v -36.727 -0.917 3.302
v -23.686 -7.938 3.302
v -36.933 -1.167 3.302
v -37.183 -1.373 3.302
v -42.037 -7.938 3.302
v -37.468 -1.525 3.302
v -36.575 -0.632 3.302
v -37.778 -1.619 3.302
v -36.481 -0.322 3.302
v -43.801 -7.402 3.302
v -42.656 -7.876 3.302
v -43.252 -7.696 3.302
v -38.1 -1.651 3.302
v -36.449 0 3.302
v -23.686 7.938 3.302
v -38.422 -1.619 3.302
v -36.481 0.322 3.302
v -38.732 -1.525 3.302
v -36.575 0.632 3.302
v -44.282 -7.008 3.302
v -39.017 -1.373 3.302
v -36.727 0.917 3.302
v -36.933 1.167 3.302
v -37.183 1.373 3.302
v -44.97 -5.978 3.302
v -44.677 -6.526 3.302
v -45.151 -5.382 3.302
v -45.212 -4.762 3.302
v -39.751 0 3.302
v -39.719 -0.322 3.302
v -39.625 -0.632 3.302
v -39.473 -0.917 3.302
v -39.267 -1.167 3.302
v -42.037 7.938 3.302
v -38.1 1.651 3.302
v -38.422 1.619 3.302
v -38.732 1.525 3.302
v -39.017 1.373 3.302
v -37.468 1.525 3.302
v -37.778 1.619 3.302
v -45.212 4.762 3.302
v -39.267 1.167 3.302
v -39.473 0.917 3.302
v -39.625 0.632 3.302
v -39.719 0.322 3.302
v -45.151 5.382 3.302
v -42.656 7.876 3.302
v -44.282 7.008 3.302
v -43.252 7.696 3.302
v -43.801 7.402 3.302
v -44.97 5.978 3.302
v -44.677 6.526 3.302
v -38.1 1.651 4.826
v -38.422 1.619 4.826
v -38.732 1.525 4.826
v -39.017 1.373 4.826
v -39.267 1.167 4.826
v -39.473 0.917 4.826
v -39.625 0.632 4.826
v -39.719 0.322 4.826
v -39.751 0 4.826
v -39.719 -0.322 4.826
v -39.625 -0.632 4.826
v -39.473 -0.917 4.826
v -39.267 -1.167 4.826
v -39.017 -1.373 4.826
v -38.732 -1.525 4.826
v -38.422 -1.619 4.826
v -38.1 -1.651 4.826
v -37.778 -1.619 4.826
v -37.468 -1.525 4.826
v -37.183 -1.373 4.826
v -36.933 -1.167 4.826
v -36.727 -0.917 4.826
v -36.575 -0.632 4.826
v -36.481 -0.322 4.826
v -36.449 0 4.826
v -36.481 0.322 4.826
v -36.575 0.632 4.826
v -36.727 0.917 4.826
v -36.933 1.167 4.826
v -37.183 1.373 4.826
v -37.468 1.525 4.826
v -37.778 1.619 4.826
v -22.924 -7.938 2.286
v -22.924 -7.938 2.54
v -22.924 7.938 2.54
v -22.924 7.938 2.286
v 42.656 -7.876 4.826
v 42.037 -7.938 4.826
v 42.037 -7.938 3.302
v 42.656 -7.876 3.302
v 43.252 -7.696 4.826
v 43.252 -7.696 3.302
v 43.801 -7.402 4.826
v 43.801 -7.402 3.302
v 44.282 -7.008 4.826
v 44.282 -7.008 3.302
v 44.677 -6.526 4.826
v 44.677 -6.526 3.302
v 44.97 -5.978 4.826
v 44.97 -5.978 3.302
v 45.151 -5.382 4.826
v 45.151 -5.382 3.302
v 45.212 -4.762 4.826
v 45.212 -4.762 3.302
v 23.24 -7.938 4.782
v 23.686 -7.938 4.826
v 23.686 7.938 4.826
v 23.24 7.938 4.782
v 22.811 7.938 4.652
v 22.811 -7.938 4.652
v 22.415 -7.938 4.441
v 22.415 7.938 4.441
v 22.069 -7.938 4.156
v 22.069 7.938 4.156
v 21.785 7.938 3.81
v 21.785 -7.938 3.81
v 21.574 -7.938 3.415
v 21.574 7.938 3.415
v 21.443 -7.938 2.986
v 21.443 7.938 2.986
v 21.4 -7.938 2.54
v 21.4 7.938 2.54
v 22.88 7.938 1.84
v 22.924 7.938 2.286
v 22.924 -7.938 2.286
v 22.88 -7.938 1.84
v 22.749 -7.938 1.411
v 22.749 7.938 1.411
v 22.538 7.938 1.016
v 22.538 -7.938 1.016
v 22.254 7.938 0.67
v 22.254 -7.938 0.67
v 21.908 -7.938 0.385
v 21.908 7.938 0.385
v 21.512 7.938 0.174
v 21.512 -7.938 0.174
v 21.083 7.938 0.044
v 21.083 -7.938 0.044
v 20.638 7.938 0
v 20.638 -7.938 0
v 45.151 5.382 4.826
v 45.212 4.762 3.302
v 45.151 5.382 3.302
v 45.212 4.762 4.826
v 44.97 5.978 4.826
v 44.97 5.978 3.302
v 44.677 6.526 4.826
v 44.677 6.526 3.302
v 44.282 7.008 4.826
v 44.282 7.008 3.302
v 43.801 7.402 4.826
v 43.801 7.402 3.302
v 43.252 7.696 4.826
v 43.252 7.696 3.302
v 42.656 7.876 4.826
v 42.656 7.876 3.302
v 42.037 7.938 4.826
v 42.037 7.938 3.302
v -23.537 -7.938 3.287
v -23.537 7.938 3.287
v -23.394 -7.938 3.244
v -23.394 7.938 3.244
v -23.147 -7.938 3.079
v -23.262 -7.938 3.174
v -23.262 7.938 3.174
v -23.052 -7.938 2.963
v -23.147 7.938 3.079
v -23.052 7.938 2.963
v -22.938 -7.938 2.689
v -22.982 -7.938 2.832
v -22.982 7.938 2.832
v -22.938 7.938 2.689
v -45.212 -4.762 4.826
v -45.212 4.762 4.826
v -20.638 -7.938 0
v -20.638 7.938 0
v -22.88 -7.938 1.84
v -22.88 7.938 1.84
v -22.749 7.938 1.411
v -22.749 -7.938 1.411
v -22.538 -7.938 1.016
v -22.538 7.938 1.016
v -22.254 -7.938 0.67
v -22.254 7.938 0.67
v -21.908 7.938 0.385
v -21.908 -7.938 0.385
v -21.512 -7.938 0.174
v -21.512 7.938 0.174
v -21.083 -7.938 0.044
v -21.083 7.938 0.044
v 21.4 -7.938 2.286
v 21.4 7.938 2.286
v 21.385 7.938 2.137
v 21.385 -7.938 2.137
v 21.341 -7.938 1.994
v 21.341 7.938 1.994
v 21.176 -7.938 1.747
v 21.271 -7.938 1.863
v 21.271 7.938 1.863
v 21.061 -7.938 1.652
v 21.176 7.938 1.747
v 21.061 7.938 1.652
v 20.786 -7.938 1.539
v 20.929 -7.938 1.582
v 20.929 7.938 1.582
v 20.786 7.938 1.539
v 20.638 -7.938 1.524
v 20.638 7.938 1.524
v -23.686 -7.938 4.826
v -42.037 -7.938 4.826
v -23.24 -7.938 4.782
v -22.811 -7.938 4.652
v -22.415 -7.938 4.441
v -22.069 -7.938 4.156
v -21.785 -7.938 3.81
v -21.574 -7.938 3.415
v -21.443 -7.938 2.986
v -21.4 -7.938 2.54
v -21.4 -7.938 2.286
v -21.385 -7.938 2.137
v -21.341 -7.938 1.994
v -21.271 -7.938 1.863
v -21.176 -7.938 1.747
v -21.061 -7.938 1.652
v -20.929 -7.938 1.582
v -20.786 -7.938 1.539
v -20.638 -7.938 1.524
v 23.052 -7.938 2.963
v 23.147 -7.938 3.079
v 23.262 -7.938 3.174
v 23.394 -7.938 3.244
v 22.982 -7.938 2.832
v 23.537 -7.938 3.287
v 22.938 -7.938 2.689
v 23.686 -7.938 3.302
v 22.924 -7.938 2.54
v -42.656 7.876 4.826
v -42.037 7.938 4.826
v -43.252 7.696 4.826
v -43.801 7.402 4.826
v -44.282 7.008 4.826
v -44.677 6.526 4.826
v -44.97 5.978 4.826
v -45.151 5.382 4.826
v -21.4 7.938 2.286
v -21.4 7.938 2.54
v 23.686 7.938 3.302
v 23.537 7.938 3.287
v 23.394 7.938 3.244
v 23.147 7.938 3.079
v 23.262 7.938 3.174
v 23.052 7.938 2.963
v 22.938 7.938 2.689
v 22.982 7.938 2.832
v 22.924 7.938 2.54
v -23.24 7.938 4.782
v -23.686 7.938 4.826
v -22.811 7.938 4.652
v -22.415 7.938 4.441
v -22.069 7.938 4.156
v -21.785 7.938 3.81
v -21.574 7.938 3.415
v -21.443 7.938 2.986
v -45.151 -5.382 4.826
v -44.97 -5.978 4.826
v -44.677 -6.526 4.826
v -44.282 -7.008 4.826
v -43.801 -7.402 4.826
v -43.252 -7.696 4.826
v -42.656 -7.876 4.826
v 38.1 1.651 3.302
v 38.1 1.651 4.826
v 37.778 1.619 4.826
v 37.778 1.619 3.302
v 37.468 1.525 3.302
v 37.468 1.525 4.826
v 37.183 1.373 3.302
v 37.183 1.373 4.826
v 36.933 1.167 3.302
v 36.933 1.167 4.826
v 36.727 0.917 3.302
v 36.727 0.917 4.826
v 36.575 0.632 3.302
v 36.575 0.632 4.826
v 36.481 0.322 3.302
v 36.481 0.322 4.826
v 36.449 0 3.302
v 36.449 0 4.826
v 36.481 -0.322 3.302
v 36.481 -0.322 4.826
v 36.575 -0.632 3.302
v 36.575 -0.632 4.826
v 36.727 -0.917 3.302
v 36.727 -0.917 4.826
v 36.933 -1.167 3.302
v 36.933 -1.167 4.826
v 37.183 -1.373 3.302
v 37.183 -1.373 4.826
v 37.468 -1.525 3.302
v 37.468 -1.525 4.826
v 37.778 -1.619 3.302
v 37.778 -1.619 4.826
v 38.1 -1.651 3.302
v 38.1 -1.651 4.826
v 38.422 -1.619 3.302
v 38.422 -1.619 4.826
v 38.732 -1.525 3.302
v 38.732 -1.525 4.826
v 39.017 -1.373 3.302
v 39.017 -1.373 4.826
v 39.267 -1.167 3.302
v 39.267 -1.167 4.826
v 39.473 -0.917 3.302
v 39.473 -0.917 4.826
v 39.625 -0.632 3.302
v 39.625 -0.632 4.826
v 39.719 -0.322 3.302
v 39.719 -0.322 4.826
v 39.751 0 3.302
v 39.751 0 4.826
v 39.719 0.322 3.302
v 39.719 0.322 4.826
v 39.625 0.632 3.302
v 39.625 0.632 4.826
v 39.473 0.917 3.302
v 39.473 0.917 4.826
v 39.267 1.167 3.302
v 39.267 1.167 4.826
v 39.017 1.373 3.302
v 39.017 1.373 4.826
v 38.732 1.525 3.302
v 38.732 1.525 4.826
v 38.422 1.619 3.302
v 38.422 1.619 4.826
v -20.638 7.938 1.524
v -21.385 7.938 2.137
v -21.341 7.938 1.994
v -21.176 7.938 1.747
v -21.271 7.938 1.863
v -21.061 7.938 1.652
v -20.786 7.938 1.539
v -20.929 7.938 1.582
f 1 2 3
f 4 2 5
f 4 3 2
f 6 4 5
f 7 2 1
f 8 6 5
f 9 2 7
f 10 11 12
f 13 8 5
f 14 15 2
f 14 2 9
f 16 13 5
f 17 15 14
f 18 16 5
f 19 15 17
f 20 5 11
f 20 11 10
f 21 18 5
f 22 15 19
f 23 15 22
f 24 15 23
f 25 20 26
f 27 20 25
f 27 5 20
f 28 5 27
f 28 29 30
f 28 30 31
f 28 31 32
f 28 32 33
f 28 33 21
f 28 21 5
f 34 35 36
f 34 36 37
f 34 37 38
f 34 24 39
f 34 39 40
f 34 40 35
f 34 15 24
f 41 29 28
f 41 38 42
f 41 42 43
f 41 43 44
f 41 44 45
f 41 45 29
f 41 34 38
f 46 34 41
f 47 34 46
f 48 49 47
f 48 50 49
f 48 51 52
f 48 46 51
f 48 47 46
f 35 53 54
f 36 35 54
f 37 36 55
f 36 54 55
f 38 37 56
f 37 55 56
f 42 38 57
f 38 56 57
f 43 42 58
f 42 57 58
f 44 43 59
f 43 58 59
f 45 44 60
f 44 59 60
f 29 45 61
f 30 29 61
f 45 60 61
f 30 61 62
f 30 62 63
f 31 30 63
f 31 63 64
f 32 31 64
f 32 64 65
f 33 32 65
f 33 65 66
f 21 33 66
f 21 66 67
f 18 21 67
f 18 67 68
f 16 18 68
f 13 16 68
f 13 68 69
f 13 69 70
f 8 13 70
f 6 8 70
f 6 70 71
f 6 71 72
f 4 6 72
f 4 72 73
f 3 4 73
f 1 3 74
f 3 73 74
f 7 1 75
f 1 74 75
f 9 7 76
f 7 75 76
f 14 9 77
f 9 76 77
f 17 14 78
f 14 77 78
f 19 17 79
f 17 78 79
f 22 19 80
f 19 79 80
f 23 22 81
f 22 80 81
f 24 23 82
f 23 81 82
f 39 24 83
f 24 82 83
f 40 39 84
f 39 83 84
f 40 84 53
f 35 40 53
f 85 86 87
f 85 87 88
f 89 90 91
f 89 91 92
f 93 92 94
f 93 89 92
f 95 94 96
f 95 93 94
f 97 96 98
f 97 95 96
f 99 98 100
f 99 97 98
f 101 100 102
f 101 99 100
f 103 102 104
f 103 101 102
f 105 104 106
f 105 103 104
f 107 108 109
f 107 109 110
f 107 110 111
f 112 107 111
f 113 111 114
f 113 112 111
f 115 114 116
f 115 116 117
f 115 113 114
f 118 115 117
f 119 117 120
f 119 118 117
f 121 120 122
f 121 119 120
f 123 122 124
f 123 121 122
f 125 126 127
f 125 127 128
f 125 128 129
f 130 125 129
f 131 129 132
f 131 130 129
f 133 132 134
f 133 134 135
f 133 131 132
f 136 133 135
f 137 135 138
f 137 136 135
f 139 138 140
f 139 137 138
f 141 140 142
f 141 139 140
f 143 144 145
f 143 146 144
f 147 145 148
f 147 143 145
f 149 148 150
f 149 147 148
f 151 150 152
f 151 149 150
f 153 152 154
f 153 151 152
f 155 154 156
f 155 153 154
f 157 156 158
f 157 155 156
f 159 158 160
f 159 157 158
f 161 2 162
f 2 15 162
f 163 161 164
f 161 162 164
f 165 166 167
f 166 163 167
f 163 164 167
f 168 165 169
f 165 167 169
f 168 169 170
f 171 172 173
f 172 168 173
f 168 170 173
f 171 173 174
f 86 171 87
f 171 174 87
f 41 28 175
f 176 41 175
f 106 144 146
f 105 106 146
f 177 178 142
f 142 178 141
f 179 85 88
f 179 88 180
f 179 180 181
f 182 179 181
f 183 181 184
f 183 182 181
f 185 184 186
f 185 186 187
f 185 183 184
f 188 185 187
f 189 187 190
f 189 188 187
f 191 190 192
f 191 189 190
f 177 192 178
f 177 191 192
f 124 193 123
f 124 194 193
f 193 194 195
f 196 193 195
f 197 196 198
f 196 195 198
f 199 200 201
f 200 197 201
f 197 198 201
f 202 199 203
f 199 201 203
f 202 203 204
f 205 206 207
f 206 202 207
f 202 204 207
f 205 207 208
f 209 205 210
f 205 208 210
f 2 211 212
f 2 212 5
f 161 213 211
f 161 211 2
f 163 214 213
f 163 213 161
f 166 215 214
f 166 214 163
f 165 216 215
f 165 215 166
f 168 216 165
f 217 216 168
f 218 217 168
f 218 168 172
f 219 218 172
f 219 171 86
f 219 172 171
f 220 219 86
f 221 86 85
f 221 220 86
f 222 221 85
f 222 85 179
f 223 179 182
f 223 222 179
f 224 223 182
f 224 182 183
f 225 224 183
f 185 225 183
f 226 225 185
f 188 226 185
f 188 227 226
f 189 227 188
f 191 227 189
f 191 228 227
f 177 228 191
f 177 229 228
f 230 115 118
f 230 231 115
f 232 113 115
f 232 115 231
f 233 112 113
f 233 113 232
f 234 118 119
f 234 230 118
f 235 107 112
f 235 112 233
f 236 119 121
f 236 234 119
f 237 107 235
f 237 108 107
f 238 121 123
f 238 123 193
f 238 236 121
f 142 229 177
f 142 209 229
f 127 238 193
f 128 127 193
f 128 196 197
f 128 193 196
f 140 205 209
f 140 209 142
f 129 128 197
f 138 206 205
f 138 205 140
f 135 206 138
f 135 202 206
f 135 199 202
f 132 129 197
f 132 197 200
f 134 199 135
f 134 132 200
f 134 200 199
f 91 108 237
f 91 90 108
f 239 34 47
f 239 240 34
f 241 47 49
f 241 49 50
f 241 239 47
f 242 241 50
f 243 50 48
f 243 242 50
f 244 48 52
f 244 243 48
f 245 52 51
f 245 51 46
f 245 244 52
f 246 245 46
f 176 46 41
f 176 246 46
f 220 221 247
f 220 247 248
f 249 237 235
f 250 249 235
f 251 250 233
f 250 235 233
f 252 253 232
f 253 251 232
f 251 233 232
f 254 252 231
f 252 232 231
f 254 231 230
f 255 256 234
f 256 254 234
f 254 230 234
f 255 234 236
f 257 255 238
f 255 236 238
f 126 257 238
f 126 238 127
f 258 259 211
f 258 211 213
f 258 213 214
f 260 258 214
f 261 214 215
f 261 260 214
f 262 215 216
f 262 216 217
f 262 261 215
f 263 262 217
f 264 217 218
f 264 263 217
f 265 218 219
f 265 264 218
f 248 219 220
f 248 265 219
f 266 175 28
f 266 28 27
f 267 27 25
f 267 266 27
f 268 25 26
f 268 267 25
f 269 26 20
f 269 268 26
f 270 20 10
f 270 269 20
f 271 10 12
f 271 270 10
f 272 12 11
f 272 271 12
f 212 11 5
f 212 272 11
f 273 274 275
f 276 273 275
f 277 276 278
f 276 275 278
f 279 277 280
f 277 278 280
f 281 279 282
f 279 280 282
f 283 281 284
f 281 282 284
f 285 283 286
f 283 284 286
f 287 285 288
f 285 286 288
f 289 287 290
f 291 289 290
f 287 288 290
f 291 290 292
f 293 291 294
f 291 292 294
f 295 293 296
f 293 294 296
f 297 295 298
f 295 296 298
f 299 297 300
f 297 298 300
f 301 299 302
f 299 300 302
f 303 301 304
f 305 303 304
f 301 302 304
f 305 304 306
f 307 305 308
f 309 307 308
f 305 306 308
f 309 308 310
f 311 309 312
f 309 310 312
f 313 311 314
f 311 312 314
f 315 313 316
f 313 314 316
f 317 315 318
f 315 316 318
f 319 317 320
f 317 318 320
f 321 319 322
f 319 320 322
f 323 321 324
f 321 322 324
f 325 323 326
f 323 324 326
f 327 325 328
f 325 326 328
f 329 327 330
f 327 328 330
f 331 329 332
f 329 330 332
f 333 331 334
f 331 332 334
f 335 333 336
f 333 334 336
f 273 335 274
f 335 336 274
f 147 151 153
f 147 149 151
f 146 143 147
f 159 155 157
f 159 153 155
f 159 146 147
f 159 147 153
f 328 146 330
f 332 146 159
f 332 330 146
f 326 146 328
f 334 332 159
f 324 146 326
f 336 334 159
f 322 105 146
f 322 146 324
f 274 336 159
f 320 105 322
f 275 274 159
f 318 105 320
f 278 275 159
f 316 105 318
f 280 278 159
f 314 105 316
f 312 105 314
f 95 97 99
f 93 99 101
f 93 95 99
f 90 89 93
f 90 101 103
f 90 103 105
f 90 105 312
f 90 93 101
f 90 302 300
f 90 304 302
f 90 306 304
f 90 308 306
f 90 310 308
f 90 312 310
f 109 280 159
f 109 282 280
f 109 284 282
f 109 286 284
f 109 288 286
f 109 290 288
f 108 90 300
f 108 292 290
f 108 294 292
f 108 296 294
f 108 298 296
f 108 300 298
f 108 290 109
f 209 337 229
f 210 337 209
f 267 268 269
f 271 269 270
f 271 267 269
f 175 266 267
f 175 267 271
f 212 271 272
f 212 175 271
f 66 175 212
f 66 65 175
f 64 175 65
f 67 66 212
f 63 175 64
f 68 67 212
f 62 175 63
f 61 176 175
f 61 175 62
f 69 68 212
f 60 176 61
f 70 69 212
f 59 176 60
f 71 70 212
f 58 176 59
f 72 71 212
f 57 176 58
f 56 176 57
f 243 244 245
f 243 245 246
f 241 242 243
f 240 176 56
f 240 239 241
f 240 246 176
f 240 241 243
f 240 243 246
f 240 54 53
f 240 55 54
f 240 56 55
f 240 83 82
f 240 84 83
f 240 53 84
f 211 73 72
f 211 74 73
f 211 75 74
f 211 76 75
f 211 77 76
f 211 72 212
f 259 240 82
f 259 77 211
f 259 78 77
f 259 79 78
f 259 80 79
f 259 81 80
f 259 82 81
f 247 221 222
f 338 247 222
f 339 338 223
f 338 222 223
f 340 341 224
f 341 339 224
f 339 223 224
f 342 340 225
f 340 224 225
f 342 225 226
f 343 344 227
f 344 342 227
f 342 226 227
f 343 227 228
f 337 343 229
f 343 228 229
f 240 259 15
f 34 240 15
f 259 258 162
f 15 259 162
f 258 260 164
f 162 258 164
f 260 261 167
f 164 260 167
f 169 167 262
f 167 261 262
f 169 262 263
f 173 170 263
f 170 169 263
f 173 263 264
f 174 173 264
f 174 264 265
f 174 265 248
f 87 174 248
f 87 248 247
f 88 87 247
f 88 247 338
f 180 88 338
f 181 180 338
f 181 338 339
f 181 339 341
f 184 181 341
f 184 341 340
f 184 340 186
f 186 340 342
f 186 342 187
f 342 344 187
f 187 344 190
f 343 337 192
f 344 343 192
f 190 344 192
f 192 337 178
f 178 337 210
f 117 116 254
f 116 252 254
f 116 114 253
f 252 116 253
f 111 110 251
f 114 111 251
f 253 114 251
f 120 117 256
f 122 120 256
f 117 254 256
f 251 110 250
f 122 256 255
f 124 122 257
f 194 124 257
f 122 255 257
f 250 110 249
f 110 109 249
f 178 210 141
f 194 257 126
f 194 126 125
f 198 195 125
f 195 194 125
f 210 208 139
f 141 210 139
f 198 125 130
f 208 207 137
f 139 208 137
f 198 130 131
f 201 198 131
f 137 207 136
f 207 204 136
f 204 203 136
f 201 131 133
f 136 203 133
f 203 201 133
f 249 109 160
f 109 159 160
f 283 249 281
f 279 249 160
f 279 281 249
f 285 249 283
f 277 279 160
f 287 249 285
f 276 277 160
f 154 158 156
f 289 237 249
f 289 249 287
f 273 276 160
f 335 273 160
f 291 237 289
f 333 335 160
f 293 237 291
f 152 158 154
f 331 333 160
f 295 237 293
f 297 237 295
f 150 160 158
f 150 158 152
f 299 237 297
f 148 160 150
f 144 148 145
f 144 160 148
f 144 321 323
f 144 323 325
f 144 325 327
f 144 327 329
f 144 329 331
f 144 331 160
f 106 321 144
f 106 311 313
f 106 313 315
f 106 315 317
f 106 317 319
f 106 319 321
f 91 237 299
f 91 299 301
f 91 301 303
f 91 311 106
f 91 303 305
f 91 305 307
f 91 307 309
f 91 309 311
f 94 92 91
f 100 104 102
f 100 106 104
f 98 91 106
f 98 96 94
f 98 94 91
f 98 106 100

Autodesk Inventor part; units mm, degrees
ref_plane "YZ Plane" through (0, 0, 0) normal (1, 0, 0) x (0, 1, 0)
ref_plane "XZ Plane" through (0, 0, 0) normal (0, 1, 0) x (-1, 0, 0)
ref_plane "XY Plane" through (0, 0, 0) normal (0, 0, 1) x (1, 0, 0)
sketch "Sketch1" plane through (0, 0, 0) normal (0, 0, 1) x (1, 0, 0)
  line L0 (-20.6375, 7.9375) -> (20.6375, 7.9375)
  line L1 (20.6375, 7.9375) -> (20.6375, -7.9375)
  line L2 (20.6375, -7.9375) -> (-20.6375, -7.9375)
  line L3 (-20.6375, -7.9375) -> (-20.6375, 7.9375)
  point P0 (0, 0)
  point P1 (0, 7.9375)
  point P2 (-20.6375, 0)
  dimension "d0" = 41.275
  dimension "d1" = 15.875
extrude "Plate1" add sketch "Sketch1" along normal blind 1.524
sketch "Sketch3" plane through (-21.3995, -7.9375, 2.286) normal (-1, 0, 0) x (0, -1, 0)
  line L0 (-15.875, 0) -> (0, 0)
  line L1 (0, 0) -> (0, 0.254)
  line L2 (0, 0.254) -> (-15.875, 0.254)
  line L3 (-15.875, 0.254) -> (-15.875, 0)
edge flange "Flange1" height 2.54 angle 90 thickness 1.524 bend radius 0.762 thickness toward (-1, 0, 0) relief tear relief width 1.524 relief depth 0.762 edges at (-20.6375, 0, 1.524) wall of the first edge with corners at (-21.3995, 7.9375, 2.286) (-21.3995, -7.9375, 2.286) (-21.3995, -7.9375, 2.54) (-21.3995, 7.9375, 2.54)
bend "Bend1"
corner "Corner1"
sketch "Sketch4" plane through (21.3995, 7.9375, 2.286) normal (1, 0, 0) x (0, 1, 0)
  line L0 (-15.875, 0) -> (0, 0)
  line L1 (0, 0) -> (0, 0.254)
  line L2 (0, 0.254) -> (-15.875, 0.254)
  line L3 (-15.875, 0.254) -> (-15.875, 0)
edge flange "Flange2" height 2.54 angle 90 thickness 1.524 bend radius 0.762 thickness toward (1, 0, 0) relief tear relief width 1.524 relief depth 0.762 edges at (20.6375, 0, 1.524) wall of the first edge with corners at (21.3995, -7.9375, 2.286) (21.3995, 7.9375, 2.286) (21.3995, 7.9375, 2.54) (21.3995, -7.9375, 2.54)
bend "Bend2"
corner "Corner2"
sketch "Sketch7" plane through (-23.6855, 7.9375, 3.302) normal (0, 0, 1) x (1, 0, 0)
  line L0 (0, -15.875) -> (0, 0)
  line L1 (0, 0) -> (-21.5265, 0)
  line L2 (-21.5265, 0) -> (-21.5265, -15.875)
  line L3 (-21.5265, -15.875) -> (0, -15.875)
edge flange "Flange5" height 23.8125 angle 90 thickness 1.524 bend radius 0.762 thickness toward (0, 0, 1) relief tear relief width 1.524 relief depth 0.762 edges at (-22.9235, 0, 2.54) wall of the first edge with corners at (-23.6855, -7.9375, 3.302) (-23.6855, 7.9375, 3.302) (-45.212, 7.9375, 3.302) (-45.212, -7.9375, 3.302)
bend "Bend5"
corner "Corner5"
sketch "Sketch8" plane through (23.6855, -7.9375, 3.302) normal (0, 0, 1) x (1, 0, 0)
  line L0 (0, 15.875) -> (0, 0)
  line L1 (0, 0) -> (21.5265, 0)
  line L2 (21.5265, 0) -> (21.5265, 15.875)
  line L3 (21.5265, 15.875) -> (0, 15.875)
edge flange "Flange6" height 23.8125 angle 90 thickness 1.524 bend radius 0.762 thickness toward (0, 0, 1) relief tear relief width 1.524 relief depth 0.762 edges at (21.3995, 0, 2.54) wall of the first edge with corners at (23.6855, 7.9375, 3.302) (23.6855, -7.9375, 3.302) (45.212, -7.9375, 3.302) (45.212, 7.9375, 3.302)
bend "Bend6"
corner "Corner6"
sketch "Sketch9" plane through (-45.212, -7.9375, 3.302) normal (0, 0, -1) x (-1, 0, 0)
  line L0 (0, 0) -> (0, 15.875) projected
  point P0 (-45.212, 7.9375)
  point P1 (-7.112, 7.9375)
  point P2 (-83.312, 7.9375)
  point P3 (0, 7.9375)
  dimension "d65" = 76.2
  dimension "d66" = 7.112
hole "Hole1" at (-38.1, 0, 3.302) at (38.1, 0, 3.302) direction (0, 0, 1) diameter 3.302 depth 1.524 tip angle 118
fillet "Corner Round1" radius 3.175 4 edges at (-45.212, -7.9375, 4.064) (-45.212, 7.9375, 4.064) (45.212, 7.9375, 4.064) (45.212, -7.9375, 4.064)
equation "\"d72\" = Thickness"
equation "\"d2\" = Thickness"
equation "\"d5\" = BendReliefWidth"
equation "\"d6\" = BendReliefDepth"
equation "\"d7\" = MinimumRemnant"
equation "\"d8\" = TransitionRadius"
equation "\"d12\" = CornerReliefSize"
equation "\"d13\" = GapSize"
equation "\"d14\" = JacobiRadiusSize"
equation "\"d15\" = BendReliefWidth"
equation "\"d16\" = BendReliefDepth"
equation "\"d17\" = MinimumRemnant"
equation "\"d18\" = TransitionRadius"
equation "\"d22\" = CornerReliefSize"
equation "\"d23\" = GapSize"
equation "\"d24\" = JacobiRadiusSize"
equation "\"d45\" = BendReliefWidth"
equation "\"d46\" = BendReliefDepth"
equation "\"d47\" = MinimumRemnant"
equation "\"d48\" = TransitionRadius"
equation "\"d52\" = CornerReliefSize"
equation "\"d53\" = GapSize"
equation "\"d54\" = JacobiRadiusSize"
equation "\"d55\" = BendReliefWidth"
equation "\"d56\" = BendReliefDepth"
equation "\"d57\" = MinimumRemnant"
equation "\"d58\" = TransitionRadius"
equation "\"d62\" = CornerReliefSize"
equation "\"d63\" = GapSize"
equation "\"d64\" = JacobiRadiusSize"
equation "\"BendRadius\" = Thickness"
equation "\"BendReliefWidth\" = Thickness"
equation "\"BendReliefDepth\" = 0.5 * Thickness"
equation "\"CornerReliefSize\" = 4 * Thickness"
equation "\"MinimumRemnant\" = 2 * Thickness"
equation "\"TransitionRadius\" = BendRadius"
equation "\"JacobiRadiusSize\" = BendRadius"
equation "\"GapSize\" = Thickness"
equation "\"Thickness\" = 1.524"
properties part number "J010308" material "STAINLESS STEEL, 316"
